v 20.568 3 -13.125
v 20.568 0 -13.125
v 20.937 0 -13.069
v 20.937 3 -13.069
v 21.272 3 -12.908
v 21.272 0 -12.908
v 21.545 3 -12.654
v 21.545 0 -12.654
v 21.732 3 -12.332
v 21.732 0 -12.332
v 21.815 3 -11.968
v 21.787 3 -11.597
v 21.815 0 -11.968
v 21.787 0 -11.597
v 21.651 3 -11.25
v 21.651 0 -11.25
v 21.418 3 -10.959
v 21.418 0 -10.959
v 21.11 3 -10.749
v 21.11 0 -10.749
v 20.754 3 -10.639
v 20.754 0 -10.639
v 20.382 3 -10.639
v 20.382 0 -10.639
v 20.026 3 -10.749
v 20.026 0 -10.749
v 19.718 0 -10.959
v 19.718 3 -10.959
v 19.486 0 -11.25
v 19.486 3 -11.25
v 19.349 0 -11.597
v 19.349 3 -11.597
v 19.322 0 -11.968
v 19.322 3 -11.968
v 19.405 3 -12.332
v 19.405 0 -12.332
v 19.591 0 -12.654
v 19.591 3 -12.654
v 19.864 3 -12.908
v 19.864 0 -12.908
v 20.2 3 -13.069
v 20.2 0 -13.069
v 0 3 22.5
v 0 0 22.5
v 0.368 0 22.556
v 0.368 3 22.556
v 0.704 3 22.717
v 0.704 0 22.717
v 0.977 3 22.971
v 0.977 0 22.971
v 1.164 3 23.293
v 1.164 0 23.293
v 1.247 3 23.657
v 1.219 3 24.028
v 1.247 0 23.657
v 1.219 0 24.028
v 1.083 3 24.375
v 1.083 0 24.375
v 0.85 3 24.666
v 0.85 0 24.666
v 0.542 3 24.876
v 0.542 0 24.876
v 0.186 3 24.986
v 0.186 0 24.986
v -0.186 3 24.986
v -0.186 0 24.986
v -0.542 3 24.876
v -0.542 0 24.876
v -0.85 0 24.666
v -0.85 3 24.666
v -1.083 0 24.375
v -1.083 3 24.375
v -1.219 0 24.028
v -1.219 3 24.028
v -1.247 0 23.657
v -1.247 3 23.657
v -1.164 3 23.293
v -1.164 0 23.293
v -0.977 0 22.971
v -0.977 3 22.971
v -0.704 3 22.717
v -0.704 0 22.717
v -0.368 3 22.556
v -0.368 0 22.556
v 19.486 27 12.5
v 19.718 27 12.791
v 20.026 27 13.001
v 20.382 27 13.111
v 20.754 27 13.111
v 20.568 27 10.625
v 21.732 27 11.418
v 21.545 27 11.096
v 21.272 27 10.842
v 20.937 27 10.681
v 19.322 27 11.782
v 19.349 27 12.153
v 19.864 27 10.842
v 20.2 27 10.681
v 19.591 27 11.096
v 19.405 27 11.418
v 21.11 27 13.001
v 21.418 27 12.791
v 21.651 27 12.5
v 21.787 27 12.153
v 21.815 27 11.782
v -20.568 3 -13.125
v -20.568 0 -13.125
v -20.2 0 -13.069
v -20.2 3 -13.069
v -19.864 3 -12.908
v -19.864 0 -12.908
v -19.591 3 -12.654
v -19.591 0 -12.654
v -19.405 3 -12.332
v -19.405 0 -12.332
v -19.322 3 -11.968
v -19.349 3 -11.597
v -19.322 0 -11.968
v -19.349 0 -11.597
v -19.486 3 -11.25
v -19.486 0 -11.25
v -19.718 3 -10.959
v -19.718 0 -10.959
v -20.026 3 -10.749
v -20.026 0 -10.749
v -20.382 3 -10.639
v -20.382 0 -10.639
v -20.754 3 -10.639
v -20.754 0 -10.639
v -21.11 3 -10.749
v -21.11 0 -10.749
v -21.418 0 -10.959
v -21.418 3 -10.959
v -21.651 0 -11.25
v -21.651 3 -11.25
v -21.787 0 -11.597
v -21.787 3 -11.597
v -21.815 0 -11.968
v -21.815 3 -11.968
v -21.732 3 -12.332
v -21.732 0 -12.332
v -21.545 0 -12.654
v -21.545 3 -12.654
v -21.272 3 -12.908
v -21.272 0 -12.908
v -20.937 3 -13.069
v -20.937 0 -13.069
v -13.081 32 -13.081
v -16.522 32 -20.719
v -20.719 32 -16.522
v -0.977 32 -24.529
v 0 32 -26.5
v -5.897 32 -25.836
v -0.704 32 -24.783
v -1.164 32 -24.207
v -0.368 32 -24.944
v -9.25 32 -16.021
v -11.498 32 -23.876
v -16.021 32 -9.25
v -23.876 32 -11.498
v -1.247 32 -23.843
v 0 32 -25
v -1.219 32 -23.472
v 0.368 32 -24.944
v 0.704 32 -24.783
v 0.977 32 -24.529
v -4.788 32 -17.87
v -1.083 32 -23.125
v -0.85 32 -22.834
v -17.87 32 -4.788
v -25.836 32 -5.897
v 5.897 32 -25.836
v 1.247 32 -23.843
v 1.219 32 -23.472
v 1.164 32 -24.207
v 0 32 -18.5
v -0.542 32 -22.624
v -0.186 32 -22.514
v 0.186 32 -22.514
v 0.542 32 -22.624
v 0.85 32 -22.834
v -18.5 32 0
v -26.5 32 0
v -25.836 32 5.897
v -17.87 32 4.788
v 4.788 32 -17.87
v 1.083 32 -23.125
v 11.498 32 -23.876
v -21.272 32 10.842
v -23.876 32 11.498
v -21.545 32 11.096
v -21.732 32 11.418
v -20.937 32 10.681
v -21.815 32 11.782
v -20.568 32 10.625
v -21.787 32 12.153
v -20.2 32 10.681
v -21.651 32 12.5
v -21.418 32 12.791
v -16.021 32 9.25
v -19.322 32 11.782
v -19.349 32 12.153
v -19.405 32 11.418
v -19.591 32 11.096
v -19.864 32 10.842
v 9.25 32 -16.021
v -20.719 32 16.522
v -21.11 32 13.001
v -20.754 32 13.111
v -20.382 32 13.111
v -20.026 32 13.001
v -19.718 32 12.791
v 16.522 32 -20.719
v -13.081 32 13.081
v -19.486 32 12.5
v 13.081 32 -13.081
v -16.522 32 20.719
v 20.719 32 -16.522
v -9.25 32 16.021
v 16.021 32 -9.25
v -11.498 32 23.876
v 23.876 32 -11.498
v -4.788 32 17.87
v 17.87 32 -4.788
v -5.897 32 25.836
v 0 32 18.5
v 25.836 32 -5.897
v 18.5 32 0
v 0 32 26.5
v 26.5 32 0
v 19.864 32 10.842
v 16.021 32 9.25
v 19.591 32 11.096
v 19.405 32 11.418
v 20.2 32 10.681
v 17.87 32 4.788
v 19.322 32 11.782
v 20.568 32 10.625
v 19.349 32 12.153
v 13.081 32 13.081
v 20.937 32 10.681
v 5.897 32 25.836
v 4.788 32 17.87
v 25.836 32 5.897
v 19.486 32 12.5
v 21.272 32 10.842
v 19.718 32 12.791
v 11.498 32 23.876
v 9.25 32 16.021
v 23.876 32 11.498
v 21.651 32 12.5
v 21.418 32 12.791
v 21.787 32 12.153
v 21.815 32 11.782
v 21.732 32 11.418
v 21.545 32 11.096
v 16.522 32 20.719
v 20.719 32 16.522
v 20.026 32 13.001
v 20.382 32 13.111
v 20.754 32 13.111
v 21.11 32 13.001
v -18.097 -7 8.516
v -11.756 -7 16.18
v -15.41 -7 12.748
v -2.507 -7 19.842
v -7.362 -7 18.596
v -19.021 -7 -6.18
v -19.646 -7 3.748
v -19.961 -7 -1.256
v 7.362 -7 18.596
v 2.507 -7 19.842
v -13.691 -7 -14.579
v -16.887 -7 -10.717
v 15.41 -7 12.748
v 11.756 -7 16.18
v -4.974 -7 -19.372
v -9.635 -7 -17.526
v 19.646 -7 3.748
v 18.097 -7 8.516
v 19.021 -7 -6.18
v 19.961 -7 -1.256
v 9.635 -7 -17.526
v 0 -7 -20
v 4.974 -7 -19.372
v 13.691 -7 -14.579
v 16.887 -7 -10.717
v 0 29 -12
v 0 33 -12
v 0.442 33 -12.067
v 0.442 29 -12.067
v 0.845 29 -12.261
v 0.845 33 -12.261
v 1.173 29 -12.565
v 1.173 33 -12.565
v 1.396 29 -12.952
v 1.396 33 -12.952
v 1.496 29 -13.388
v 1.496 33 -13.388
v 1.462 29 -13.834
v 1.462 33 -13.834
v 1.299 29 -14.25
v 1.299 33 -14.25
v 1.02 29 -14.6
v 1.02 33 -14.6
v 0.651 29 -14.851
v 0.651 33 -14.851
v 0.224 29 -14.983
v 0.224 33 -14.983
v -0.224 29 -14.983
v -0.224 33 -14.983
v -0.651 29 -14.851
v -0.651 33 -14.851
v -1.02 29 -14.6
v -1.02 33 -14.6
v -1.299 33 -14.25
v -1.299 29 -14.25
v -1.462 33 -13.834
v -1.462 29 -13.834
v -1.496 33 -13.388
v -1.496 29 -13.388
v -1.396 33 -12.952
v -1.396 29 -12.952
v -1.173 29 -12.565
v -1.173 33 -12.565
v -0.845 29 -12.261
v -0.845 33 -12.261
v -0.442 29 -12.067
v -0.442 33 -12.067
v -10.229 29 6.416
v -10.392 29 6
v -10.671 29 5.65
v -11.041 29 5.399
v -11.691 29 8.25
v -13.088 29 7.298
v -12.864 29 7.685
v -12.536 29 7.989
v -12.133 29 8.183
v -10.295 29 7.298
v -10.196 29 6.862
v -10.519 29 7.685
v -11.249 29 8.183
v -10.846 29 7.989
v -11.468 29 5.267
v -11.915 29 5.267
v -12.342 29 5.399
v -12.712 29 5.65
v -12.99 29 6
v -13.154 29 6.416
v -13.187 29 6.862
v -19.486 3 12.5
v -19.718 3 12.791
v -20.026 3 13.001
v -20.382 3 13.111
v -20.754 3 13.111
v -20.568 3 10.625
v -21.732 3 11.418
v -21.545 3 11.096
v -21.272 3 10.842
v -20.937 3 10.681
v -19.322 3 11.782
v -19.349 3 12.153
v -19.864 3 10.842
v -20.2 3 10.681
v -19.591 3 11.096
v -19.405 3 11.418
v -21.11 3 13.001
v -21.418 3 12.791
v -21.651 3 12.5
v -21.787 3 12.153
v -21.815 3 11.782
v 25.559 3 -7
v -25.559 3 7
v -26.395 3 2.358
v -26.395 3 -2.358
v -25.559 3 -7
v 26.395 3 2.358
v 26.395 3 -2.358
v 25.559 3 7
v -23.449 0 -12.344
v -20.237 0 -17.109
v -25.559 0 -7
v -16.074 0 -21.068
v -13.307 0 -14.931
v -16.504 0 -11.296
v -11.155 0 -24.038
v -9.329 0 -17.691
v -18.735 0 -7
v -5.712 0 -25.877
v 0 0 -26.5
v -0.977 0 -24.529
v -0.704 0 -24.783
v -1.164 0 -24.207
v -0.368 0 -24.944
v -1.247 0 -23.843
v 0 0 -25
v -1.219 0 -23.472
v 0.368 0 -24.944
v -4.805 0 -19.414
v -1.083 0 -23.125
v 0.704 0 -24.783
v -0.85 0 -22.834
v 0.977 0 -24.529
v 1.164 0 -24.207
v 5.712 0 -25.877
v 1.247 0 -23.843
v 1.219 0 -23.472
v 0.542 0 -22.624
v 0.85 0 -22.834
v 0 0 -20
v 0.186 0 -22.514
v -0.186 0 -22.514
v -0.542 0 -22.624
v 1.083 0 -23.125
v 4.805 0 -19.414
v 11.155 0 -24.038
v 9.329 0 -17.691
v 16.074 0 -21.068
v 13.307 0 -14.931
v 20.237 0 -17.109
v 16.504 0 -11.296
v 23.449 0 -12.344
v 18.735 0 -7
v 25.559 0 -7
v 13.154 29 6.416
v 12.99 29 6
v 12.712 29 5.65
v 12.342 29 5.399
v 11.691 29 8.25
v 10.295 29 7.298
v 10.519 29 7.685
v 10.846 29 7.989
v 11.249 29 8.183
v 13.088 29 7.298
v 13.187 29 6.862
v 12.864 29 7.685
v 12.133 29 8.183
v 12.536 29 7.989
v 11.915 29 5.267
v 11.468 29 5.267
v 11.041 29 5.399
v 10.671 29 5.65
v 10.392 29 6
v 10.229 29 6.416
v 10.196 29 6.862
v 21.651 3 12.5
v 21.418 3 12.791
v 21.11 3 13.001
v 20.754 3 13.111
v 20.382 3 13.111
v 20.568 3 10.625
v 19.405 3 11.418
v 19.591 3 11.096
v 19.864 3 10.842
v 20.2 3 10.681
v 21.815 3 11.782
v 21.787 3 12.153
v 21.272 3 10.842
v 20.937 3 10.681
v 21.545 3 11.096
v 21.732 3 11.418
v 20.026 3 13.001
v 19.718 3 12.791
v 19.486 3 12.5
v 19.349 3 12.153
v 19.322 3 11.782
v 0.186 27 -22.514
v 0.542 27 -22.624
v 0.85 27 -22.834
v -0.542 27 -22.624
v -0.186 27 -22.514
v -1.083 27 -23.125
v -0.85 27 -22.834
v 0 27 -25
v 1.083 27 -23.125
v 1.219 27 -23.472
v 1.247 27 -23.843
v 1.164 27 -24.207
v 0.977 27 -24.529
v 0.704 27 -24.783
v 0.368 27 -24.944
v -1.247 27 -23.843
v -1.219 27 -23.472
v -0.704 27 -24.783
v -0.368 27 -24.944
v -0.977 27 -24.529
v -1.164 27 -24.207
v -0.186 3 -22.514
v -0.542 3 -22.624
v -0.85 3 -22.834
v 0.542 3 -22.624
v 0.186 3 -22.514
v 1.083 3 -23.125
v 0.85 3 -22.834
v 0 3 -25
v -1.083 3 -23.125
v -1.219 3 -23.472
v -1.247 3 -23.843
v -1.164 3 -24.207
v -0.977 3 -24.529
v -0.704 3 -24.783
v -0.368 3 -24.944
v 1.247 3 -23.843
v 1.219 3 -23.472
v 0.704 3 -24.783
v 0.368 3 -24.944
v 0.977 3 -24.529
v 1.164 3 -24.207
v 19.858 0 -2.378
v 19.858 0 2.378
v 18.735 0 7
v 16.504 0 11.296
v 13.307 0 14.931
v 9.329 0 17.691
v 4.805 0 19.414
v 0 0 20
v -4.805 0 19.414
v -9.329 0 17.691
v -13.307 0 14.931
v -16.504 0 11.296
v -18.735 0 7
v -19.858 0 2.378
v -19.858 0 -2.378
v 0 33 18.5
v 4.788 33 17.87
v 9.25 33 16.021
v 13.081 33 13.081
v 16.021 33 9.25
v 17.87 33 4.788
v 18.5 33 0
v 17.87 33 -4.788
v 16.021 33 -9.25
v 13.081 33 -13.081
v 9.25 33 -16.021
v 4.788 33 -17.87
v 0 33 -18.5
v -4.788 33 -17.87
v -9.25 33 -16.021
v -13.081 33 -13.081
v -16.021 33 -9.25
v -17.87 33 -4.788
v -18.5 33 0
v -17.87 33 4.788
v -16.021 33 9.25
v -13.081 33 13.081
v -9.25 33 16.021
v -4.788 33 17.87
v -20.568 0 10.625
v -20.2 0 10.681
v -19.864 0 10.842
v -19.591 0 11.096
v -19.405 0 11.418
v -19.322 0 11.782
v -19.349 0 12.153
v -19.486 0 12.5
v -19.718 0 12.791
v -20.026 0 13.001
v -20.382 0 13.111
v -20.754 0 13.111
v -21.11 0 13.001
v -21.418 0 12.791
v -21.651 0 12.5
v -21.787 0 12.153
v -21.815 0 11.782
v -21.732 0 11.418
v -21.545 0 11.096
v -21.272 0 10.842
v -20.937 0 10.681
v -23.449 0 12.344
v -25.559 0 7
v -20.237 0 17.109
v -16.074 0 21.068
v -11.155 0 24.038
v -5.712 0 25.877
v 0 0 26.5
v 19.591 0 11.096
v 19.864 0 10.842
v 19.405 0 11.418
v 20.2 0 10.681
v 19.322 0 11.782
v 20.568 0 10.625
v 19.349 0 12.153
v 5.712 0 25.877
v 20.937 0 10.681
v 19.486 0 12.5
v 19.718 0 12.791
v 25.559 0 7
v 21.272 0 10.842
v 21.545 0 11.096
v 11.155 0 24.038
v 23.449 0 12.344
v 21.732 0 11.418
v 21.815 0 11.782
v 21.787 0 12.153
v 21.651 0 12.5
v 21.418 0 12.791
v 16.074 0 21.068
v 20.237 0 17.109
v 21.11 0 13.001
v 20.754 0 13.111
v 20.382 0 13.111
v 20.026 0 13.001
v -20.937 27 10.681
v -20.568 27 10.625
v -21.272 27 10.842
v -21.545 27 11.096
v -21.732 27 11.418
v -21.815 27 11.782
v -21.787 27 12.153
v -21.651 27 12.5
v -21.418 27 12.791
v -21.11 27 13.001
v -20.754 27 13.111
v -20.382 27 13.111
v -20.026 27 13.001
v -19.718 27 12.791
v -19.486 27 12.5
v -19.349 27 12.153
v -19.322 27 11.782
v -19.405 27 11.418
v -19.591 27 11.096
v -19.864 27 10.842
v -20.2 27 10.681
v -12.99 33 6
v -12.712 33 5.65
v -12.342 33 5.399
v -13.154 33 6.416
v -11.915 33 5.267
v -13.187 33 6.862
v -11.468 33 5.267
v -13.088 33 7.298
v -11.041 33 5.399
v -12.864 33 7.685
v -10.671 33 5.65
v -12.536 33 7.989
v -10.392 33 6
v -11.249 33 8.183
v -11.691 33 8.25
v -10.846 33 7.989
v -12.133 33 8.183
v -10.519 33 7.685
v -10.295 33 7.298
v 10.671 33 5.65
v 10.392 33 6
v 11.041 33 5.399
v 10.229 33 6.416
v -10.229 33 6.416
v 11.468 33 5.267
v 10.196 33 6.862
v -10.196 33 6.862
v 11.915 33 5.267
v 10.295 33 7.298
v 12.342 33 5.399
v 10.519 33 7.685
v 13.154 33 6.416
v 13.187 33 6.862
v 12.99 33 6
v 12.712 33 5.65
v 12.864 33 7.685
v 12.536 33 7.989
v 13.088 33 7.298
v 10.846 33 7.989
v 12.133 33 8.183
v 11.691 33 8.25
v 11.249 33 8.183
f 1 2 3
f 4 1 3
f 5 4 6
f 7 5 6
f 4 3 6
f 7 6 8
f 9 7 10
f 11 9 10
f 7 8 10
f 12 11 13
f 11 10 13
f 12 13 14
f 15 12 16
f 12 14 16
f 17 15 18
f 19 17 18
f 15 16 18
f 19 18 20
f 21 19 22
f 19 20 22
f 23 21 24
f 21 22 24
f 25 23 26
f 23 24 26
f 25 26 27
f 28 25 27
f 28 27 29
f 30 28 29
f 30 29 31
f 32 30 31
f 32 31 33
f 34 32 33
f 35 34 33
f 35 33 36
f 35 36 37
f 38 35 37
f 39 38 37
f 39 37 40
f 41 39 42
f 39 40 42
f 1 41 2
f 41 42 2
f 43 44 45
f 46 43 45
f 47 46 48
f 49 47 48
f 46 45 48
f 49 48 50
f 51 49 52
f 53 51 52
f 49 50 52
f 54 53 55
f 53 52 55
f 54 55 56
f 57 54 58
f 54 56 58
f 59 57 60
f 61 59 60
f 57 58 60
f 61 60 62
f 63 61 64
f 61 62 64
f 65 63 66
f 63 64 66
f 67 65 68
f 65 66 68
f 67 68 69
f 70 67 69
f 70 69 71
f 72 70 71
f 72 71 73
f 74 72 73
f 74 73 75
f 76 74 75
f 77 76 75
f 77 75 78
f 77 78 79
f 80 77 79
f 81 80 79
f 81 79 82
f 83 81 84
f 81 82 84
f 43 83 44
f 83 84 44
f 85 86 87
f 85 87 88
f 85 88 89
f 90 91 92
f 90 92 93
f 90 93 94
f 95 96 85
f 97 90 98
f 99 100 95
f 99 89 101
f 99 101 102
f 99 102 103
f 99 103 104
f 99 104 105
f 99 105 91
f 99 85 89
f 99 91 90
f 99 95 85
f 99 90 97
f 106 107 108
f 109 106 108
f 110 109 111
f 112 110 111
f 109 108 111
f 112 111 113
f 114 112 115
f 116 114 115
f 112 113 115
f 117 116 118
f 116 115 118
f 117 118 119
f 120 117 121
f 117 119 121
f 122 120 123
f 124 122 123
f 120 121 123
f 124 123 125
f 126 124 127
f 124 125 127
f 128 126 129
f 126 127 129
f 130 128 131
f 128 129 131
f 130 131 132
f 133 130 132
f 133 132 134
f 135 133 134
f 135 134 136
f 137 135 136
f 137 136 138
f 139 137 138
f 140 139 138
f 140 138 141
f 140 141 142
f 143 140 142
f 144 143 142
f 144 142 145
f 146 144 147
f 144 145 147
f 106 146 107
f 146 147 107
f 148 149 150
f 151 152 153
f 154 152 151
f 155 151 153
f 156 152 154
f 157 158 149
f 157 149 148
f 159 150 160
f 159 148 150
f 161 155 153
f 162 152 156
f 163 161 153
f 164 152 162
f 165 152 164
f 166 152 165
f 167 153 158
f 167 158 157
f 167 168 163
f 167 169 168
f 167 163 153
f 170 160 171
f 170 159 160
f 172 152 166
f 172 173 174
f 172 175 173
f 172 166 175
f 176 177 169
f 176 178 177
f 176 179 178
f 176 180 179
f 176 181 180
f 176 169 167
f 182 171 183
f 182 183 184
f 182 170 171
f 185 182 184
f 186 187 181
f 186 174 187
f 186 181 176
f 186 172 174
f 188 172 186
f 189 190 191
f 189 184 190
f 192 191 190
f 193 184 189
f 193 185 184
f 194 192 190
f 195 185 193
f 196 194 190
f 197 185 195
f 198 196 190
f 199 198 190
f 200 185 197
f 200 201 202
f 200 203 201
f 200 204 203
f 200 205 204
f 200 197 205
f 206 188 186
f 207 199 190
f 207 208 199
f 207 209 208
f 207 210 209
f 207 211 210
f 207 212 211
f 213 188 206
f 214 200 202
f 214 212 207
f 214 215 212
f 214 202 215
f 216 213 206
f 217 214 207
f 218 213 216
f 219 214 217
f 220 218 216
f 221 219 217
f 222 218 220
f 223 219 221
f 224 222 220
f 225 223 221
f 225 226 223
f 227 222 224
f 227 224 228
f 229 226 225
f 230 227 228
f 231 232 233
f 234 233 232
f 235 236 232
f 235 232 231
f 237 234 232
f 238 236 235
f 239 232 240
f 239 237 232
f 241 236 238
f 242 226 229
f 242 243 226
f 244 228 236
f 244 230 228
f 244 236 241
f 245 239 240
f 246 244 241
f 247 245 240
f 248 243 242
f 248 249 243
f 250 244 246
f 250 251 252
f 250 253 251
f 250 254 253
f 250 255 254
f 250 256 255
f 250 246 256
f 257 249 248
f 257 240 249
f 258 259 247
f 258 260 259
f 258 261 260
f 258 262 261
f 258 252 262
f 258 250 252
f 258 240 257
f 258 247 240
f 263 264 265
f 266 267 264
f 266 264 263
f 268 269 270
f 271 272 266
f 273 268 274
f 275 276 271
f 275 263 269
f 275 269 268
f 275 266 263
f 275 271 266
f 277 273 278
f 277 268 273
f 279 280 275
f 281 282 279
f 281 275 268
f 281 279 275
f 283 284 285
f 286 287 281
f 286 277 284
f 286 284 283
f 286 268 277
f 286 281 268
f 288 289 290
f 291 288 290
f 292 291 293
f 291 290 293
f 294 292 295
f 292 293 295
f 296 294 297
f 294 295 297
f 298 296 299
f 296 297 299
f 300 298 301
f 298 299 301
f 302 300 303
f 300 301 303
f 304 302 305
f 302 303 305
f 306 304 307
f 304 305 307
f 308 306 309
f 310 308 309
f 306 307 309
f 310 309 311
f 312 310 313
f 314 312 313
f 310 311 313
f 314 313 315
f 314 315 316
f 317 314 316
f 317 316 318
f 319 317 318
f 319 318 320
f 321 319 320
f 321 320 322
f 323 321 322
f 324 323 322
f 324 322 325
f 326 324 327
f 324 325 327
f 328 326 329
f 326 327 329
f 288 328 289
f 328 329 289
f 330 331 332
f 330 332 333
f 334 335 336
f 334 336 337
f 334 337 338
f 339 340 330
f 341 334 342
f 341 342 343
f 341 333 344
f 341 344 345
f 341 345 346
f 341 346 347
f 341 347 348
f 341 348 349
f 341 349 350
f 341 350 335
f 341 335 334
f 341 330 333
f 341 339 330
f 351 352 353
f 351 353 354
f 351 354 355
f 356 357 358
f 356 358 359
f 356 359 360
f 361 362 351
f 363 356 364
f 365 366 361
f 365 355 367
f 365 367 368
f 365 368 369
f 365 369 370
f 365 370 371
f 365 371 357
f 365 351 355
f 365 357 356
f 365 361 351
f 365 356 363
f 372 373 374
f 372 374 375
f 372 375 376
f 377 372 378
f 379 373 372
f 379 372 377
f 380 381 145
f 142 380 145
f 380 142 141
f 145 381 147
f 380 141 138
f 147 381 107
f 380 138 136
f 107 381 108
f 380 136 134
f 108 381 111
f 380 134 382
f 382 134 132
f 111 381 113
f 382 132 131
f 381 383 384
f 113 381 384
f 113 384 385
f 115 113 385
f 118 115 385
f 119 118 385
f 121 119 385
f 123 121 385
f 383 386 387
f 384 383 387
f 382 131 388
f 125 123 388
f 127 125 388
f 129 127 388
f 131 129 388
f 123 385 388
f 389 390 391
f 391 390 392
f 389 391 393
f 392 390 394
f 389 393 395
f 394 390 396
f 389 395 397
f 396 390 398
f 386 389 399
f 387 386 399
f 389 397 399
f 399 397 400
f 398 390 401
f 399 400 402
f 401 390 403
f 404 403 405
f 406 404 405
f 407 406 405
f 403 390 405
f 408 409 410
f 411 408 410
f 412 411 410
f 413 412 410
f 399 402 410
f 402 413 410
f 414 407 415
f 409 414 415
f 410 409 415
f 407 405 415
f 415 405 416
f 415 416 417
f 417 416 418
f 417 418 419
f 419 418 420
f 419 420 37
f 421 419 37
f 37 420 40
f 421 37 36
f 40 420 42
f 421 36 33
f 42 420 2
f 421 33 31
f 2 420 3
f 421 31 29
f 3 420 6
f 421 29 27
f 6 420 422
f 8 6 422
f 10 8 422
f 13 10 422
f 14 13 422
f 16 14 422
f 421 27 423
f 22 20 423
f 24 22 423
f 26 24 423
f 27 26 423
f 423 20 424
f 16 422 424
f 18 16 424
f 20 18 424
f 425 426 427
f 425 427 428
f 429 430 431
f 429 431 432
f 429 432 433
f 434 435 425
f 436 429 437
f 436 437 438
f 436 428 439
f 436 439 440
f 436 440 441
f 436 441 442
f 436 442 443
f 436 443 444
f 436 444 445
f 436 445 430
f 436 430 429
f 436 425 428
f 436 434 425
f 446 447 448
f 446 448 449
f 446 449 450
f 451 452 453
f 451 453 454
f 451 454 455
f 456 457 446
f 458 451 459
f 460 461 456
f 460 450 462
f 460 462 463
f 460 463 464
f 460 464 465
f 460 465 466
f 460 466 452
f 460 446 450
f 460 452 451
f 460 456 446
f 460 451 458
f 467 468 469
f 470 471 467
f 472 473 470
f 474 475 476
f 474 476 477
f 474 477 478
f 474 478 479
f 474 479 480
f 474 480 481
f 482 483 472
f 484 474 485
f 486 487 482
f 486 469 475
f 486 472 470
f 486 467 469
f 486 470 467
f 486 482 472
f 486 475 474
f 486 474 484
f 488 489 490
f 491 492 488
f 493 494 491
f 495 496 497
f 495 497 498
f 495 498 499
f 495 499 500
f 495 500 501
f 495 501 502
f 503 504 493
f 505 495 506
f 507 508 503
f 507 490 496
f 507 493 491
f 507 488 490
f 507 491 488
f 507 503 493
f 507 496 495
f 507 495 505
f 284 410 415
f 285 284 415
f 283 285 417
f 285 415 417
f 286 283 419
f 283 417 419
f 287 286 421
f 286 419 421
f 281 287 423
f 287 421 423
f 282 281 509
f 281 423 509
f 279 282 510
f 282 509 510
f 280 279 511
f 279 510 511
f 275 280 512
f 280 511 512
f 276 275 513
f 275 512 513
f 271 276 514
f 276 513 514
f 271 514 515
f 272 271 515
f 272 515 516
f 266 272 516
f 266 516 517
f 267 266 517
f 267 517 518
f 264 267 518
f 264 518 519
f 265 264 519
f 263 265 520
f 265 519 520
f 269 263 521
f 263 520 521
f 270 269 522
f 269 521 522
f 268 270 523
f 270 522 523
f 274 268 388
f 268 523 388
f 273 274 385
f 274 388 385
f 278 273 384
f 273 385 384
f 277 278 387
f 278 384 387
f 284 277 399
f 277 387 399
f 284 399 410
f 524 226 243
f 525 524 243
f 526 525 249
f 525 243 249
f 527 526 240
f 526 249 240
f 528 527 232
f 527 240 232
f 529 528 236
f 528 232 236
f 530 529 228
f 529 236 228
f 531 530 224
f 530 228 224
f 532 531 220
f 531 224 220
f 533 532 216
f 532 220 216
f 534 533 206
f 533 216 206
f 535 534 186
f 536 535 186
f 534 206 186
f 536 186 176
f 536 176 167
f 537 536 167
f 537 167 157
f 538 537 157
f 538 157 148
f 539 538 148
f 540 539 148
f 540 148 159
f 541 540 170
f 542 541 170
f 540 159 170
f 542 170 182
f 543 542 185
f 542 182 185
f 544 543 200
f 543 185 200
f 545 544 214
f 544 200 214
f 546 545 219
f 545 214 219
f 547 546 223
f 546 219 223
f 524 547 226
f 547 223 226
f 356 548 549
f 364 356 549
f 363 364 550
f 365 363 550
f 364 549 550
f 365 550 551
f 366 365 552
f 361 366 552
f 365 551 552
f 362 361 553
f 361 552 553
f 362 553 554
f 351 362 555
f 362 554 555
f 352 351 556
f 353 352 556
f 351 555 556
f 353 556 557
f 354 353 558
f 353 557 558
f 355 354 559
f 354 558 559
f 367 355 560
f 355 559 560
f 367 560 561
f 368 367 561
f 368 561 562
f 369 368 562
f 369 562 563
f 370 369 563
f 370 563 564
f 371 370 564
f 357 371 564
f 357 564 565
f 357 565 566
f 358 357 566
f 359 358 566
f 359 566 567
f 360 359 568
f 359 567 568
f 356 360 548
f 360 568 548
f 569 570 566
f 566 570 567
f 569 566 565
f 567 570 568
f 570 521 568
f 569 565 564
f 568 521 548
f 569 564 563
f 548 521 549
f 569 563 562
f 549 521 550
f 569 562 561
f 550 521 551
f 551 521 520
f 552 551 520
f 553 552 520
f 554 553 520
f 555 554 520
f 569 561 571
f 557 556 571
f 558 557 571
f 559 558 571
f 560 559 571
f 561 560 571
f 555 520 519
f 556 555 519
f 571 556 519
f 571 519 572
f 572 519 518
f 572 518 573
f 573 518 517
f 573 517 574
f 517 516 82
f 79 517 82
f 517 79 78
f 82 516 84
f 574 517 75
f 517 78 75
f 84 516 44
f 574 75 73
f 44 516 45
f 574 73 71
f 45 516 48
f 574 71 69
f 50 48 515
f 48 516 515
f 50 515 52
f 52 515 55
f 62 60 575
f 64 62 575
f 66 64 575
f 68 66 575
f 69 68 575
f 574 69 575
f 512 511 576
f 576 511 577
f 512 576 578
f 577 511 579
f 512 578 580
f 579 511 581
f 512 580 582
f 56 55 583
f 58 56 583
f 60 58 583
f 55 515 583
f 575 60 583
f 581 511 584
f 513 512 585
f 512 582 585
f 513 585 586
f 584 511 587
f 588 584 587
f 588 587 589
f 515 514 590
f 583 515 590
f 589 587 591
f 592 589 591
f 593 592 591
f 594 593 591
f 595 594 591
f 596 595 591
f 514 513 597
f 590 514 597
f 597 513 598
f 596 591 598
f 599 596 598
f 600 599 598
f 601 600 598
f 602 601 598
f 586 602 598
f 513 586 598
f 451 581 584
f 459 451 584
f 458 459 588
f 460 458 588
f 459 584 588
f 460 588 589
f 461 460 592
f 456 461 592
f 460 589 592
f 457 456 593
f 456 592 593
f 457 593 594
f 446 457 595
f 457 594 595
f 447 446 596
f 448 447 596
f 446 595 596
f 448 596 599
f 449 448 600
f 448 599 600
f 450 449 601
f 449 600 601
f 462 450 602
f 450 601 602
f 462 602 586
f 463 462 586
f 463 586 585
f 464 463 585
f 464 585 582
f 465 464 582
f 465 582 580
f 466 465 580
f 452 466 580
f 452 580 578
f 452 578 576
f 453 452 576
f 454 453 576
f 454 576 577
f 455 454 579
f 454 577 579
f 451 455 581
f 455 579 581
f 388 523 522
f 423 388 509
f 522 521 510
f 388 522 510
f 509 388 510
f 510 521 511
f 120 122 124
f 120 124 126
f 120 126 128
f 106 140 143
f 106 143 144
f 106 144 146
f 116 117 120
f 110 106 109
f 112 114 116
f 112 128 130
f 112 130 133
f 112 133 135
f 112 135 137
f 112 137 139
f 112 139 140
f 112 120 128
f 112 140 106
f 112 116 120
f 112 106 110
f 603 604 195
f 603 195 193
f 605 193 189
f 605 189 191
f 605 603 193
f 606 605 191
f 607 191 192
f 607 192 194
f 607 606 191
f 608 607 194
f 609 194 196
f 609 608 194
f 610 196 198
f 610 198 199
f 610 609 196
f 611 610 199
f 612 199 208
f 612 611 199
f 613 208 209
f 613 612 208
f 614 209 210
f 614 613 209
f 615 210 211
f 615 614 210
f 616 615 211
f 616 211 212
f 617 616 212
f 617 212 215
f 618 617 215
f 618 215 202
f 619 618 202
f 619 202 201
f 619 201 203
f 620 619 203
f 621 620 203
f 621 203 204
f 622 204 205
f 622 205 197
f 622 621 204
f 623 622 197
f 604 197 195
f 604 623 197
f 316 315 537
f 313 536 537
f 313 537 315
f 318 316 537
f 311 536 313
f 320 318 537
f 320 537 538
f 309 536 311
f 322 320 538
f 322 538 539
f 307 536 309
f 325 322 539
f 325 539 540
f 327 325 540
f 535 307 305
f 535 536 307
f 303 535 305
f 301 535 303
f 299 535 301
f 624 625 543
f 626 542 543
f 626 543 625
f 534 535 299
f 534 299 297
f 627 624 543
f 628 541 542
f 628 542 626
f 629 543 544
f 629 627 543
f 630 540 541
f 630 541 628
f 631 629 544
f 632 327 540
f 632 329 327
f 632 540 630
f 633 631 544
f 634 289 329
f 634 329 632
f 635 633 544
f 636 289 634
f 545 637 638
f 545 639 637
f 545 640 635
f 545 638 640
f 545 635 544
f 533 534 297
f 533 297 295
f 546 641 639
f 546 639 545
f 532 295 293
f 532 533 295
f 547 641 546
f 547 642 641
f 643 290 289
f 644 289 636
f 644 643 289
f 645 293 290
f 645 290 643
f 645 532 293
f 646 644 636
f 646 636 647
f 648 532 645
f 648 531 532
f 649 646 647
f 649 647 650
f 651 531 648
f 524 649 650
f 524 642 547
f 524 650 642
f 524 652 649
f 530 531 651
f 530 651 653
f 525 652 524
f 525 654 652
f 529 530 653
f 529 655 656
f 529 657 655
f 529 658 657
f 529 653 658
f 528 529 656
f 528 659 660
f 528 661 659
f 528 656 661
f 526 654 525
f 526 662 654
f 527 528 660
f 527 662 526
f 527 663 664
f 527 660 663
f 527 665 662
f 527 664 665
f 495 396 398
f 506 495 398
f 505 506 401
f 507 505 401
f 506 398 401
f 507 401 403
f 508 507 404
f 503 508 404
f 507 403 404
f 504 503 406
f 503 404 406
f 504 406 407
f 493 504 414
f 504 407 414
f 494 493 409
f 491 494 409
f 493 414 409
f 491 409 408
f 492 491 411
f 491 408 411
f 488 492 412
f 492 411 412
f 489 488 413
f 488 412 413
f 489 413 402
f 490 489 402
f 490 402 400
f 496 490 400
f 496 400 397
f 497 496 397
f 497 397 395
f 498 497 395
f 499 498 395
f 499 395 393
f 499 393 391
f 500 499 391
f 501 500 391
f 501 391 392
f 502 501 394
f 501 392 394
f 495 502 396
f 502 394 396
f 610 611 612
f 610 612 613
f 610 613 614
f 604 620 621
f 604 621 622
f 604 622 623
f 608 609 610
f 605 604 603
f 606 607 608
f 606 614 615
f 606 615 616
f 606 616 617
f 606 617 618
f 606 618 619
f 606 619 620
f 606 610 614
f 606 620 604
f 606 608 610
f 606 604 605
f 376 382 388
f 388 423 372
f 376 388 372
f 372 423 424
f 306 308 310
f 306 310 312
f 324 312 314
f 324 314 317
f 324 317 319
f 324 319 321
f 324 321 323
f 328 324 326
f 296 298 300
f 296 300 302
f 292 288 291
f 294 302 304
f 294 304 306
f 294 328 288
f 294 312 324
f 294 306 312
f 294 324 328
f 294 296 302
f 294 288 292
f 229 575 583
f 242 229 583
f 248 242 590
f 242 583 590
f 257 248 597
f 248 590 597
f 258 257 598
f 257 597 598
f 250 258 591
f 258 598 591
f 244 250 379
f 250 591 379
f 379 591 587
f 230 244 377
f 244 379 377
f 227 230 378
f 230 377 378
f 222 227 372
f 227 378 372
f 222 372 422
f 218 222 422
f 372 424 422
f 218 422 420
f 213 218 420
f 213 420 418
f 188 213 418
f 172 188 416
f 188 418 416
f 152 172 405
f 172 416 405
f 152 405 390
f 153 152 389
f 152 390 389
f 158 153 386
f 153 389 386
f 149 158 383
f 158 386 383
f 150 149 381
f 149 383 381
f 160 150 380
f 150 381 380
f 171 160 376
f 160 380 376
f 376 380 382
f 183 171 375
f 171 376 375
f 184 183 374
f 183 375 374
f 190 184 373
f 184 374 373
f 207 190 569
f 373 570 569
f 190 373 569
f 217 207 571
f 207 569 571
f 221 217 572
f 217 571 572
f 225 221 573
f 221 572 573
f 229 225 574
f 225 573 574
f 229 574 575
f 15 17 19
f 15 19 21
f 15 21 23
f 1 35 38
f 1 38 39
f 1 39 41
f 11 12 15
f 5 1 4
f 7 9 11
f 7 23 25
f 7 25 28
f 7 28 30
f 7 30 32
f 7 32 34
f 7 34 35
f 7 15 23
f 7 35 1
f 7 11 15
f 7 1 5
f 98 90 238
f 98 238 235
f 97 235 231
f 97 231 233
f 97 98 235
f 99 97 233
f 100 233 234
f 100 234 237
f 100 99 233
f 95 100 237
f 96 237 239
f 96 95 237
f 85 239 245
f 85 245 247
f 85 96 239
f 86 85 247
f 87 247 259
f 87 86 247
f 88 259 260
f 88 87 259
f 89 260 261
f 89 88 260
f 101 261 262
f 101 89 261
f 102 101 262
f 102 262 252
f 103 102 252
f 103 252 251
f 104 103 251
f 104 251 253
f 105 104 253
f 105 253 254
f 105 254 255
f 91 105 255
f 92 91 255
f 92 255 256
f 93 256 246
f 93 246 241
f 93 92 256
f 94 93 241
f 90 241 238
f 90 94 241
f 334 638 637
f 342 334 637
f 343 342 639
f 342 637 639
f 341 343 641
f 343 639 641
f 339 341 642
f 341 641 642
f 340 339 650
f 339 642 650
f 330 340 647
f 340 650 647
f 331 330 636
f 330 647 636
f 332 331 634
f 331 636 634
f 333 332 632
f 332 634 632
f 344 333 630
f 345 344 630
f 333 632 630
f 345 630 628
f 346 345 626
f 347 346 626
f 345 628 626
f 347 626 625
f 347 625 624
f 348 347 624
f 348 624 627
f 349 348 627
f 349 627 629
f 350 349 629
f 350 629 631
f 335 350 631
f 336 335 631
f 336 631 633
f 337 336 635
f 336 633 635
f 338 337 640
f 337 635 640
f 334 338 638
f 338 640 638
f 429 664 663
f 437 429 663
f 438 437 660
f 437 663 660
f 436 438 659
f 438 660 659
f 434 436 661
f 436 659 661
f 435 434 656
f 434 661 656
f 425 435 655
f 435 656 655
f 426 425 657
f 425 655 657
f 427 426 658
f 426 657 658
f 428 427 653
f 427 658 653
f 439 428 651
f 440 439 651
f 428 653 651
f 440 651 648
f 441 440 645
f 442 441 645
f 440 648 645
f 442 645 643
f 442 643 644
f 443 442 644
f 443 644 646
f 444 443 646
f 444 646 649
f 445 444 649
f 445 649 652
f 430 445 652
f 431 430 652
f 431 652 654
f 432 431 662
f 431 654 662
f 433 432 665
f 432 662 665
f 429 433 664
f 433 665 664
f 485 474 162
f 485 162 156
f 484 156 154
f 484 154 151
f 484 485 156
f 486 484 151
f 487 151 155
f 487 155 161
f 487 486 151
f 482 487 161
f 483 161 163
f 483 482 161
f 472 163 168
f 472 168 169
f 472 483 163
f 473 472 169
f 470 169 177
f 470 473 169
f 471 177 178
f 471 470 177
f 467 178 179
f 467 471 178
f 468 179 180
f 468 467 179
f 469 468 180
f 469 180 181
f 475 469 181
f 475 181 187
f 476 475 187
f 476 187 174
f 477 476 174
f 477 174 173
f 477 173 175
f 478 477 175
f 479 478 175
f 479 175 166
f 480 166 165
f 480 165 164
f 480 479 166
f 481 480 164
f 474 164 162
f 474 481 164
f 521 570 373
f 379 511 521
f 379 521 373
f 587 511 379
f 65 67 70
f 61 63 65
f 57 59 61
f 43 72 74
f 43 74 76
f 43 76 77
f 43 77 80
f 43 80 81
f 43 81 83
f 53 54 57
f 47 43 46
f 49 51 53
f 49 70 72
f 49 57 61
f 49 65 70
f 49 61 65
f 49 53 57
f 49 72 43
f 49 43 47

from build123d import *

# Parameters (mm, degrees)
SKETCH1_R           = 26.5
BOSS_EXTRUDE1_DEPTH = 32
SKETCH2_R           = 20
BOSS_EXTRUDE2_DEPTH = 7
SKETCH3_R           = 18.5
BOSS_EXTRUDE3_DEPTH = 1
SKETCH4_R           = 1.25
CUT_EXTRUDE1_DEPTH  = 3
SKETCH5_R           = 1.5
CUT_EXTRUDE2_DEPTH  = 4
CUT_EXTRUDE3_START  = -5
SKETCH6_R           = 1.25
CUT_EXTRUDE3_DEPTH  = 5
SKETCH7_W           = 60.119067385
SKETCH7_H           = 14
CUT_EXTRUDE4_DEPTH  = 3


with BuildPart() as part:
    # Sketch1 → Boss-Extrude1 (new body)
    with BuildSketch(Plane(origin=(0, 0, 0), x_dir=(1, 0, 0), z_dir=(0, 1, 0))):
        with Locations(Location((0, 0, 0), (0, 0, 270))):
            Circle(SKETCH1_R)
    extrude(amount=BOSS_EXTRUDE1_DEPTH)

    # Sketch2 → Boss-Extrude2 (add)
    with BuildSketch(Plane.XZ):
        with Locations(Location((0, 0, 0), (0, 0, 270))):
            Circle(SKETCH2_R)
    extrude(amount=BOSS_EXTRUDE2_DEPTH)

    # Sketch3 → Boss-Extrude3 (add)
    with BuildSketch(Plane(origin=(0, 32, 0), x_dir=(1, 0, 0), z_dir=(0, 1, 0))):
        with Locations(Location((0, 0, 0), (0, 0, 270))):
            Circle(SKETCH3_R)
    extrude(amount=BOSS_EXTRUDE3_DEPTH)

    # Sketch4 → Cut-Extrude1 (cut)
    with BuildSketch(Plane.XZ):
        with Locations(Location((0, 23.75, 0), (0, 0, 270))):
            Circle(SKETCH4_R)
        with Locations(Location((20.56810334, 11.875, 0), (0, 0, 270))):
            Circle(SKETCH4_R)
        with Locations(Location((20.56810334, -11.875, 0), (0, 0, 270))):
            Circle(SKETCH4_R)
        with Locations(Location((0, -23.75, 0), (0, 0, 270))):
            Circle(SKETCH4_R)
        with Locations(Location((-20.56810334, -11.875, 0), (0, 0, 270))):
            Circle(SKETCH4_R)
        with Locations(Location((-20.56810334, 11.875, 0), (0, 0, 270))):
            Circle(SKETCH4_R)
    extrude(amount=-CUT_EXTRUDE1_DEPTH, mode=Mode.SUBTRACT)

    # Sketch5 → Cut-Extrude2 (cut)
    with BuildSketch(Plane(origin=(0, 33, 0), x_dir=(1, 0, 0), z_dir=(0, 1, 0))):
        with Locations(Location((0, 13.5, 0), (0, 0, 270))):
            Circle(SKETCH5_R)
        with Locations(Location((11.691342951, -6.75, 0), (0, 0, 270))):
            Circle(SKETCH5_R)
        with Locations(Location((-11.691342951, -6.75, 0), (0, 0, 270))):
            Circle(SKETCH5_R)
    extrude(amount=-CUT_EXTRUDE2_DEPTH, mode=Mode.SUBTRACT)

    # Sketch6 → Cut-Extrude3 (cut)
    with BuildSketch(Plane(origin=(0, 32, 0), x_dir=(1, 0, 0), z_dir=(0, 1, 0)).offset(CUT_EXTRUDE3_START)):
        with Locations(Location((0, 23.75, 0), (0, 0, 90))):
            Circle(SKETCH6_R)
        with Locations(Location((20.56810334, -11.875, 0), (0, 0, 90))):
            Circle(SKETCH6_R)
        with Locations(Location((-20.56810334, -11.875, 0), (0, 0, 90))):
            Circle(SKETCH6_R)
    extrude(amount=CUT_EXTRUDE3_DEPTH, mode=Mode.SUBTRACT)

    # Sketch7 → Cut-Extrude4 (cut)
    with BuildSketch(Plane.XZ):
        with Locations((1.148519733, 0)):
            Rectangle(SKETCH7_W, SKETCH7_H)
    extrude(amount=-CUT_EXTRUDE4_DEPTH, mode=Mode.SUBTRACT)


solid = part.part
